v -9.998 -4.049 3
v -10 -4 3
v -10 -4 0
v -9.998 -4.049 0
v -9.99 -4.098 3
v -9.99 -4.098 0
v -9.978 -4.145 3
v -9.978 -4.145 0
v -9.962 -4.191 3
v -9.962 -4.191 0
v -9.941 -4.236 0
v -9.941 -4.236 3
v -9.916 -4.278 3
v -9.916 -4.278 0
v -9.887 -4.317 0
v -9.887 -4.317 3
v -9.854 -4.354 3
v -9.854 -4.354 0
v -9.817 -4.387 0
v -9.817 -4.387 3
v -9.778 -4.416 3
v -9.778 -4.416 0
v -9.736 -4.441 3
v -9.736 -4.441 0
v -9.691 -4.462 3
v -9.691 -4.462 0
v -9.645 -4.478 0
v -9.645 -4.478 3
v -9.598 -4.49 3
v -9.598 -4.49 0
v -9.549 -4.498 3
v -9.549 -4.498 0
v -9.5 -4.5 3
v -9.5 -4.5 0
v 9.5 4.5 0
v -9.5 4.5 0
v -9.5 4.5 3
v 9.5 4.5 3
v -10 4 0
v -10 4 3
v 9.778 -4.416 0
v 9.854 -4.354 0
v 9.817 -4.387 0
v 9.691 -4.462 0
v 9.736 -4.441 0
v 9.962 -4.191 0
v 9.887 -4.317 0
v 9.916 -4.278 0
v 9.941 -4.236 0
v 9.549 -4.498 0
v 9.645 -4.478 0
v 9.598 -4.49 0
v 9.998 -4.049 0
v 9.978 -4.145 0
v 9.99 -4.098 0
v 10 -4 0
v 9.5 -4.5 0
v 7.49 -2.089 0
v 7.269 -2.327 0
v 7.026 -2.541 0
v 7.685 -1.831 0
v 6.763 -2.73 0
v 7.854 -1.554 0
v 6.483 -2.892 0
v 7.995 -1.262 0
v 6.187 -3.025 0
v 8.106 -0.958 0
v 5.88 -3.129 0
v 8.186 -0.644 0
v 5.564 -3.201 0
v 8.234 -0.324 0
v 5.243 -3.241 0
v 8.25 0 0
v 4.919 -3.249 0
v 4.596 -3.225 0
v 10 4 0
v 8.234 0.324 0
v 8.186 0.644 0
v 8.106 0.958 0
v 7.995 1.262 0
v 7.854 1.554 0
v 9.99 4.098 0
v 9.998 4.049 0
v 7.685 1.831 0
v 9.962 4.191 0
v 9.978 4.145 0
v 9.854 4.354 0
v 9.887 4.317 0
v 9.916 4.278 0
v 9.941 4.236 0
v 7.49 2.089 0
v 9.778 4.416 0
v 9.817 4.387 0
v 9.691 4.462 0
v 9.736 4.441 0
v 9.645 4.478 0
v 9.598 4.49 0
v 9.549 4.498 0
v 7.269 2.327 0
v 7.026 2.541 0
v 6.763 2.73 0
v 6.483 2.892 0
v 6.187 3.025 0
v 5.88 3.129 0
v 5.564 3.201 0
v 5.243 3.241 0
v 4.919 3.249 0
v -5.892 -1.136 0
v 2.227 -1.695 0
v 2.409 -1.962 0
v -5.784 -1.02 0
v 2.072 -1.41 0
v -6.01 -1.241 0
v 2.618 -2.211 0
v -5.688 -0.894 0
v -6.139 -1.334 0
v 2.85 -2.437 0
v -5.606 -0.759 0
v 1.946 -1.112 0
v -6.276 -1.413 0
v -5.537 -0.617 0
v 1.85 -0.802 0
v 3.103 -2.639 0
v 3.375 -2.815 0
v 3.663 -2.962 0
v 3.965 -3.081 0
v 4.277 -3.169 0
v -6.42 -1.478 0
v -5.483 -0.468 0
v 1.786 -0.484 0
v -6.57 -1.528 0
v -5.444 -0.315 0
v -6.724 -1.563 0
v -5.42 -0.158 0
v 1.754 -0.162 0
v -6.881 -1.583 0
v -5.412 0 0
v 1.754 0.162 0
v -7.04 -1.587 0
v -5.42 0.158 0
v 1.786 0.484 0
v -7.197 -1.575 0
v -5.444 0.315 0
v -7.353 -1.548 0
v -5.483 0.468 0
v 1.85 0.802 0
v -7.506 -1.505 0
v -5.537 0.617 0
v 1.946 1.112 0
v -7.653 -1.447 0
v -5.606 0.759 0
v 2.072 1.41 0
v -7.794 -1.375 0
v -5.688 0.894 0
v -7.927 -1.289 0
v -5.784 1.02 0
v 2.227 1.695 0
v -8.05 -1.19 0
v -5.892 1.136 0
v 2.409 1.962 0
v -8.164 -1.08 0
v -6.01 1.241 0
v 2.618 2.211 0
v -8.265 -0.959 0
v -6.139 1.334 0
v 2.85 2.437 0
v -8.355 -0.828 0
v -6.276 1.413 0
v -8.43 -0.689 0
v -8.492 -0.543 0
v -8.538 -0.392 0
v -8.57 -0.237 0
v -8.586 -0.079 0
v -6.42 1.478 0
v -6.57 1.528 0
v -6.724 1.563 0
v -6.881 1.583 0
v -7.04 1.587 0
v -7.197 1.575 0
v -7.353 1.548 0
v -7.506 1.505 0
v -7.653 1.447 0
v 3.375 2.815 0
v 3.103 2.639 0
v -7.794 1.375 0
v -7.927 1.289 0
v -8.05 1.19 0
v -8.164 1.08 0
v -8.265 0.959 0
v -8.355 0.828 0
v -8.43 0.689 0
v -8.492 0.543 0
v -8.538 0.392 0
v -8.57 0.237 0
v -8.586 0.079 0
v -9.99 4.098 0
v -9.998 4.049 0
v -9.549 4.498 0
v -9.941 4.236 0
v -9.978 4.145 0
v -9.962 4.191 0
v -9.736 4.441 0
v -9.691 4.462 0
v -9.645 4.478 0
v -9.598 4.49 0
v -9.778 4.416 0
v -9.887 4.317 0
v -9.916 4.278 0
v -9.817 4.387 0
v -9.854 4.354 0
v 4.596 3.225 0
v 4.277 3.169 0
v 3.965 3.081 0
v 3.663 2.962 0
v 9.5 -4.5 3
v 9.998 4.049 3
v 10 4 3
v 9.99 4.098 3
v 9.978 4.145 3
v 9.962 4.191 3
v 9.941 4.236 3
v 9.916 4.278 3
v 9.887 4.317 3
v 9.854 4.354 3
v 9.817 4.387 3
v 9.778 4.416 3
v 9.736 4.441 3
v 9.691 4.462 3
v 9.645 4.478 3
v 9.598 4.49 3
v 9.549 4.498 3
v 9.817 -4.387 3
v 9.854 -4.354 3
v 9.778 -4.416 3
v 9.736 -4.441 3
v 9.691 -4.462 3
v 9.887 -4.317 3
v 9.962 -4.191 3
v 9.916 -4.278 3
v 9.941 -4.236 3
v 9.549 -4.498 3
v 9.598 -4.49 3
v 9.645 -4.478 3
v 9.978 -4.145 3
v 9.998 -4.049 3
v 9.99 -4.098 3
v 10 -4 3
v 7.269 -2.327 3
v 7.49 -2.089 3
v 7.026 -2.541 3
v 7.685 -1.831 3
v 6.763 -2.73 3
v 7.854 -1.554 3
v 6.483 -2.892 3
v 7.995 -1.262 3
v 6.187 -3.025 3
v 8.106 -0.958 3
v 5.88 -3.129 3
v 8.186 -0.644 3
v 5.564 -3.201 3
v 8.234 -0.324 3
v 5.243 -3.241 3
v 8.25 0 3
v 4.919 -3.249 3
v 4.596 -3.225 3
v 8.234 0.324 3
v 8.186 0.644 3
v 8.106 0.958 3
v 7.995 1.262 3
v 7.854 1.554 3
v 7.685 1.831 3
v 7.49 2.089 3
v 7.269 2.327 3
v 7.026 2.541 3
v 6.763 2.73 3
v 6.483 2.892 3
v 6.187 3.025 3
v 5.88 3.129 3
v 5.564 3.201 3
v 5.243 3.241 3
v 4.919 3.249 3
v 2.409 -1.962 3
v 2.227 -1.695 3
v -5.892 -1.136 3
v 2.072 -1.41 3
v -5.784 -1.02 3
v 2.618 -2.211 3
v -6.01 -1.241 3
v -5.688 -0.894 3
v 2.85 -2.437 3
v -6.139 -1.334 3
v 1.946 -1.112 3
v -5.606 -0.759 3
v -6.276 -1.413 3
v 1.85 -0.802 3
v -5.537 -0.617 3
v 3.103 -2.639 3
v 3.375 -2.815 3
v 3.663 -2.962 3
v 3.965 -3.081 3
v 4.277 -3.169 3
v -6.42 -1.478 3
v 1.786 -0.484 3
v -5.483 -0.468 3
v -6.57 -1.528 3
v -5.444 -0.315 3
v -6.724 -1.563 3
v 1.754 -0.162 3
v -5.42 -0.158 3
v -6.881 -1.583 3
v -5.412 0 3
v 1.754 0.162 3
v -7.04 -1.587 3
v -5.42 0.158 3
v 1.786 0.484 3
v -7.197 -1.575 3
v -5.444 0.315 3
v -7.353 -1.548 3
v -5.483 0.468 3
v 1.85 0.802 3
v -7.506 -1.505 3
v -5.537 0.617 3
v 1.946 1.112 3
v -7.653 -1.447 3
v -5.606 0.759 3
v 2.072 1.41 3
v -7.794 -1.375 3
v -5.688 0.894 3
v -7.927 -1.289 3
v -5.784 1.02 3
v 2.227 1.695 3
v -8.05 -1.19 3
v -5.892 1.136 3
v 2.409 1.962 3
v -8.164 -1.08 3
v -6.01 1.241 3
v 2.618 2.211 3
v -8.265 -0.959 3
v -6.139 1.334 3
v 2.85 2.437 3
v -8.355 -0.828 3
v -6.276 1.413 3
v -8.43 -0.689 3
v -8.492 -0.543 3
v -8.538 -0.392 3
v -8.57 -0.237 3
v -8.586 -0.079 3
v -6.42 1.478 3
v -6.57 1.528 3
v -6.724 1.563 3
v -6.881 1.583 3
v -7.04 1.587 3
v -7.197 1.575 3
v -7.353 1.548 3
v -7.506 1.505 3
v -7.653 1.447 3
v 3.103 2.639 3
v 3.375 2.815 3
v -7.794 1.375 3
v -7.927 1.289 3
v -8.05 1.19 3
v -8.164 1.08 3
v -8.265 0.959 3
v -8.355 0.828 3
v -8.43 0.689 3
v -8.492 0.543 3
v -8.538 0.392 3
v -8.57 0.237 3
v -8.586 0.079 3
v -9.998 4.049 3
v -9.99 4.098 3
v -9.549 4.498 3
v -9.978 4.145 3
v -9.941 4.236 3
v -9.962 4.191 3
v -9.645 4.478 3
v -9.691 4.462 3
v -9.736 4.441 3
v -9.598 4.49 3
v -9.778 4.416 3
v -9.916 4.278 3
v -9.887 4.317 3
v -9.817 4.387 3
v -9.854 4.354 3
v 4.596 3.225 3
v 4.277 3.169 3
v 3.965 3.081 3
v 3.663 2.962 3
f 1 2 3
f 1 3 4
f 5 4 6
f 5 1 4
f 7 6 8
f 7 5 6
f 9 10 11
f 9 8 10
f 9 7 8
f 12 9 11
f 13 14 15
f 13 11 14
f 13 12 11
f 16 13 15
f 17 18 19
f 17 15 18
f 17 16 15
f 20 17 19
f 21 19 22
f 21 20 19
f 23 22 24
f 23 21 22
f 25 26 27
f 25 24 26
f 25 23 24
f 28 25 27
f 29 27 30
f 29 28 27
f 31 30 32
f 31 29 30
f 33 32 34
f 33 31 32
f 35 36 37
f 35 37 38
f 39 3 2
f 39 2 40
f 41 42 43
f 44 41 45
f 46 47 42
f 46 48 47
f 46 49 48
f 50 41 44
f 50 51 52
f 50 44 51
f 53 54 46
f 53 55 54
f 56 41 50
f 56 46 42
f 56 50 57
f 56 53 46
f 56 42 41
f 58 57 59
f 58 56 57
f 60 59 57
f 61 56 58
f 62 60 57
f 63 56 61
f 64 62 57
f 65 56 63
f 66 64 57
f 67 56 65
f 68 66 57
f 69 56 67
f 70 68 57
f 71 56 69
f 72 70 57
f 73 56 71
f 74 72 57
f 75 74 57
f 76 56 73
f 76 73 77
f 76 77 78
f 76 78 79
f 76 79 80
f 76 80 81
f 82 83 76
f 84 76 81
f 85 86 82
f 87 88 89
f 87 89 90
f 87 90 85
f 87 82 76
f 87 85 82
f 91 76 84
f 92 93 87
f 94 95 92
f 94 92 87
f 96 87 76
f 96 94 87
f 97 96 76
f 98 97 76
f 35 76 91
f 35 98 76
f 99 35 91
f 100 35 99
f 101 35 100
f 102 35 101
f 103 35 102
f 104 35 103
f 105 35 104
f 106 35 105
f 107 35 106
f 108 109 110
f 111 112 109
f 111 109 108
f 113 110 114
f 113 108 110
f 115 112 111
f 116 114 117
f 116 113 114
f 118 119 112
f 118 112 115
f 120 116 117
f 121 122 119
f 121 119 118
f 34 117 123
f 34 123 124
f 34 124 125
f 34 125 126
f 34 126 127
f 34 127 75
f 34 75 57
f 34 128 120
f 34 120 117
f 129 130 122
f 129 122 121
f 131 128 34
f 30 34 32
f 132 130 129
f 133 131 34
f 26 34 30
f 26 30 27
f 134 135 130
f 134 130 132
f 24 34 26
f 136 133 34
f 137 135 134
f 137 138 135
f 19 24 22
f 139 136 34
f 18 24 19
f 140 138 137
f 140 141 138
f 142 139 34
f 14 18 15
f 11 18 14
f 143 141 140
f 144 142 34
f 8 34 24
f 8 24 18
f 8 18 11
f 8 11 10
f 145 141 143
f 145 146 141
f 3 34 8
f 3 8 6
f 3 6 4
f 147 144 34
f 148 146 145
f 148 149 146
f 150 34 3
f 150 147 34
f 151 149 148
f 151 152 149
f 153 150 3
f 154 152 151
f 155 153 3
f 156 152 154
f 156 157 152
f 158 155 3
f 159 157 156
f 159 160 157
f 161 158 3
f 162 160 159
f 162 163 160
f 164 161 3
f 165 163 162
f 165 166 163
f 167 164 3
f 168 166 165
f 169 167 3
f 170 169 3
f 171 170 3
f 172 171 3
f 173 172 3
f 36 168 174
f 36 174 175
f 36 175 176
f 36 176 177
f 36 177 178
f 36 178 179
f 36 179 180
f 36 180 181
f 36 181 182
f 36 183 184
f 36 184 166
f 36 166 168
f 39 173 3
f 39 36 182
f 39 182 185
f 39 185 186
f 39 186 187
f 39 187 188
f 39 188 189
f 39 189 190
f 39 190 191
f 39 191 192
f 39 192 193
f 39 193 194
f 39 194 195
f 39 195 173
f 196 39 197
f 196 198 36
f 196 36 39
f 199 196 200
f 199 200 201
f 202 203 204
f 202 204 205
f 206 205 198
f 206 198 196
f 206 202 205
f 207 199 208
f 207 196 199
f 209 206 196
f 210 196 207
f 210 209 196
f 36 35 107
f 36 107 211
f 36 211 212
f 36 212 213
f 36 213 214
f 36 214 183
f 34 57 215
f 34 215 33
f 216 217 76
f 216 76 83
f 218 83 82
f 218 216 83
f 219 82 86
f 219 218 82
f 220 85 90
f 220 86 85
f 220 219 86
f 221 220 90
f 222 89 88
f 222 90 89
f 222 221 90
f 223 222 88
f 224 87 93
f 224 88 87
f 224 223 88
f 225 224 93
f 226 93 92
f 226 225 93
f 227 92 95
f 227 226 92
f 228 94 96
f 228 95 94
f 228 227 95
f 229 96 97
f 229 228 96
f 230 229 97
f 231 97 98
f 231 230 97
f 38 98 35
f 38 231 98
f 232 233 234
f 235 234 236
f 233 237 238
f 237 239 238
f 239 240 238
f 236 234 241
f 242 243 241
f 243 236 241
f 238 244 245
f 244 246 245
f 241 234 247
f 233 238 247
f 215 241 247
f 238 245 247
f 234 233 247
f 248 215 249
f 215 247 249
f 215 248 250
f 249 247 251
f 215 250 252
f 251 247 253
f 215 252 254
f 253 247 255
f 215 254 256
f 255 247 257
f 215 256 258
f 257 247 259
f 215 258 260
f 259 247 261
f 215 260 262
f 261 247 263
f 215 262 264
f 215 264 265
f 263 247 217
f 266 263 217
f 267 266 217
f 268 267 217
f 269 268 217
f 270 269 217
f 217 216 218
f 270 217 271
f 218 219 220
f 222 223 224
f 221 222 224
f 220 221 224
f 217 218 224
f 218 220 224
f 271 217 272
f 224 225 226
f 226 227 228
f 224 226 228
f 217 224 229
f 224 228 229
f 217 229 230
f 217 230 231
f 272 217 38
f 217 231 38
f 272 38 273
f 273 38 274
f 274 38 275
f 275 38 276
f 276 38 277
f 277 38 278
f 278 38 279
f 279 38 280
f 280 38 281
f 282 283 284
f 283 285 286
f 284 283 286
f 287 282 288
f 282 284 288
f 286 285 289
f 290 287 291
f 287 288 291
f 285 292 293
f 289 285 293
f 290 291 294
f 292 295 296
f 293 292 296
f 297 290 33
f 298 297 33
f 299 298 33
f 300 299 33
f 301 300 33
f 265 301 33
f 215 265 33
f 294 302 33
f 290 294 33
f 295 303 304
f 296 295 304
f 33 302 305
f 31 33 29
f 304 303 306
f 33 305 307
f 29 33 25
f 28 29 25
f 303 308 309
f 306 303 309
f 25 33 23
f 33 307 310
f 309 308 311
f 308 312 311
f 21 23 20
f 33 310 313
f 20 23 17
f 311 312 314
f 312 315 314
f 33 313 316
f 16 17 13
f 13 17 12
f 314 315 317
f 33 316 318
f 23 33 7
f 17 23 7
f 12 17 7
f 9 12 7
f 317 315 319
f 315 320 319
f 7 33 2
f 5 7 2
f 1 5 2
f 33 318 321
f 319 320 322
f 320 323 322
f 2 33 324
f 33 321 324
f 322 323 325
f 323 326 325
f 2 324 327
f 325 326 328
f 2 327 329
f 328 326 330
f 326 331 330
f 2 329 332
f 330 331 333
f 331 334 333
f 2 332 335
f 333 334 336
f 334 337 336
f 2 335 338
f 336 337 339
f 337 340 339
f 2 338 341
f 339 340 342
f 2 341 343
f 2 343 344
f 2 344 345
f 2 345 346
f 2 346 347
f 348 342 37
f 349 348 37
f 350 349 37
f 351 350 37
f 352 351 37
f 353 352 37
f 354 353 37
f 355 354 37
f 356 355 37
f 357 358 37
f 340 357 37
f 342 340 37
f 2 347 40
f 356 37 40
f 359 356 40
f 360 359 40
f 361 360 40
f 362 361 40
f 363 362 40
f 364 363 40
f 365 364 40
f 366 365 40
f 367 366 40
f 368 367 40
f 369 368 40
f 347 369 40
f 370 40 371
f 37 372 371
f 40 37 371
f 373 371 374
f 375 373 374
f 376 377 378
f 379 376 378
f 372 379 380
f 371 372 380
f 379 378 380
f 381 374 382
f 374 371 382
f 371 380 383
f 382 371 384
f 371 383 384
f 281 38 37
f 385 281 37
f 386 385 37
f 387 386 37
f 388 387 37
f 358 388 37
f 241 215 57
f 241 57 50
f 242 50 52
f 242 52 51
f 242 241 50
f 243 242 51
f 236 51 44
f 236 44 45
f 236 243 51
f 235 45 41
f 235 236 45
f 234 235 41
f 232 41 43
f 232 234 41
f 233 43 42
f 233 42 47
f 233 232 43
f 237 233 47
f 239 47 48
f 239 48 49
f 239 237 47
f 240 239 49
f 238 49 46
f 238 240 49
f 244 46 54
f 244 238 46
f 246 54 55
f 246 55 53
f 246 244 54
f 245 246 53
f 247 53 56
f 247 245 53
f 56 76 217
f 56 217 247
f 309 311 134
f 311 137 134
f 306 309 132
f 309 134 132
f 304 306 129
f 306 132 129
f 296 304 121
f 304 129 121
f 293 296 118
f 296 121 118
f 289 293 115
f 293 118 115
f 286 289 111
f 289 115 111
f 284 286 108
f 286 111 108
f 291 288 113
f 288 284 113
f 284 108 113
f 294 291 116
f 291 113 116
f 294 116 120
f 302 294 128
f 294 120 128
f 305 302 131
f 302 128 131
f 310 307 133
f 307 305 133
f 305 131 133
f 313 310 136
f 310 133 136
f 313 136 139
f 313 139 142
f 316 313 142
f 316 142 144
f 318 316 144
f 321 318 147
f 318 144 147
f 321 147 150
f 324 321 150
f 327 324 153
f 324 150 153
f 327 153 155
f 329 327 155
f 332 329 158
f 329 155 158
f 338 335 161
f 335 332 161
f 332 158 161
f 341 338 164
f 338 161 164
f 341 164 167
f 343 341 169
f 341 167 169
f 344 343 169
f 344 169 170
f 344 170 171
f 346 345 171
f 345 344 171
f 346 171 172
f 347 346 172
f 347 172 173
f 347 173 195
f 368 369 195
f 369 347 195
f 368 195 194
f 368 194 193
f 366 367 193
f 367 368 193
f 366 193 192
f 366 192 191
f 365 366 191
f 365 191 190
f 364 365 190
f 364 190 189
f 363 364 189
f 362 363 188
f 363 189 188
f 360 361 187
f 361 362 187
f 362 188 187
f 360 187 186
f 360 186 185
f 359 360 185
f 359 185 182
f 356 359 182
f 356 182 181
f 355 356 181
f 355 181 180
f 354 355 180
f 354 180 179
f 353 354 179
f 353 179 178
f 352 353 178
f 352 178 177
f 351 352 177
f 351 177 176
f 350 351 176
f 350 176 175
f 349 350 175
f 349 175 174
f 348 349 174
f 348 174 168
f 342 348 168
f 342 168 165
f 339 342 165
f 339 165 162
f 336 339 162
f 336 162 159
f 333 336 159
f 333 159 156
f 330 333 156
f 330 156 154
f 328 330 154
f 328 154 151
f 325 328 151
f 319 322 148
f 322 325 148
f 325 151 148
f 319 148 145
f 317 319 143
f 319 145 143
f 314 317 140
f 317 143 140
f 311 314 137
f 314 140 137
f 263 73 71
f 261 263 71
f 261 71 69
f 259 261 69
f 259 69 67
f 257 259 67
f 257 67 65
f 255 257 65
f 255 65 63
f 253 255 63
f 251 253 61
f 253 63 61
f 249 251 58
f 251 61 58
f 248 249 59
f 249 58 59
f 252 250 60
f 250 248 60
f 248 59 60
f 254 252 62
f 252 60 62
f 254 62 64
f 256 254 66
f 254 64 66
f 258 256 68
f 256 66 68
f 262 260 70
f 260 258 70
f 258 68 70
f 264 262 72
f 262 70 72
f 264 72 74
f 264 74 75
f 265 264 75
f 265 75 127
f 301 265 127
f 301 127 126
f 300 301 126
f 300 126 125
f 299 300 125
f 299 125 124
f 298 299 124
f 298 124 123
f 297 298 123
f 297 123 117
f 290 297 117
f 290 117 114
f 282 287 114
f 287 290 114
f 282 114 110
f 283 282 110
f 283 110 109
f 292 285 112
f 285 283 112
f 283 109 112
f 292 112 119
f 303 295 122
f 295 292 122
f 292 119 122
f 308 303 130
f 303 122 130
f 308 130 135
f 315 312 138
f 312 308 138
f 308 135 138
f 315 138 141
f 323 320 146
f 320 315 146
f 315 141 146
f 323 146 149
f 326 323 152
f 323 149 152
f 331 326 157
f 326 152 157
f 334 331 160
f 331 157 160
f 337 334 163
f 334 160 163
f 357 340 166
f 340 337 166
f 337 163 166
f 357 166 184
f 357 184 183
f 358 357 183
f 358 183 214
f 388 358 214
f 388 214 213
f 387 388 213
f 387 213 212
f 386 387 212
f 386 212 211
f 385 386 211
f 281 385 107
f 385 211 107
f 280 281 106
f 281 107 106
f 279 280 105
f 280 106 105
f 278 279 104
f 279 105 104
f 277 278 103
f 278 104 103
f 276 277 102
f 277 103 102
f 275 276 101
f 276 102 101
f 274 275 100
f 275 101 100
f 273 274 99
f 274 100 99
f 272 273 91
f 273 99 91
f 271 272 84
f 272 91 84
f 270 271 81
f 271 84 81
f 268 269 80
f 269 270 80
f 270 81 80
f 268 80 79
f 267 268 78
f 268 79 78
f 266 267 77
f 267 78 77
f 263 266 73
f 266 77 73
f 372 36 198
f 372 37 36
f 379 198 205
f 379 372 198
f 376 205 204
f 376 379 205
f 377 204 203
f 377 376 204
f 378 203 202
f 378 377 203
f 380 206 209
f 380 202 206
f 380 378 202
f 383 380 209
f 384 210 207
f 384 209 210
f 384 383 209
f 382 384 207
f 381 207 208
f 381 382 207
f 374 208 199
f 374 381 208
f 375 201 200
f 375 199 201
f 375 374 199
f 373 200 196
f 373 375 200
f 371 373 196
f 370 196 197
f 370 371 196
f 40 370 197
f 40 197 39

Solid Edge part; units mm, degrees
sketch "Sketch1" plane through (0, 0, 0) normal (0, 0, 1) x (1, 0, 0)
  line L0 (10, -4.5) -> (-10, -4.5)
  line L1 (-10, -4.5) -> (-10, 4.5)
  line L2 (-10, 4.5) -> (10, 4.5)
  line L3 (10, 4.5) -> (10, -4.5)
  circle A0 centre (5, 0) radius 3.25
  circle A1 centre (-7, 0) radius 1.5875
  dimension "D1" = 20
  dimension "D2" = 9
  dimension "D3" = 6.5
  dimension "D4" = 5
  dimension "D5" = 3.175
  dimension "D6" = 17
extrude "Protrusion1" add sketch "Sketch1" along normal blind 3
fillet "Round_1" radius 0.5 4 edges at (10, -4.5, 1.5) (10, 4.5, 1.5) (-10, 4.5, 1.5) (-10, -4.5, 1.5)
